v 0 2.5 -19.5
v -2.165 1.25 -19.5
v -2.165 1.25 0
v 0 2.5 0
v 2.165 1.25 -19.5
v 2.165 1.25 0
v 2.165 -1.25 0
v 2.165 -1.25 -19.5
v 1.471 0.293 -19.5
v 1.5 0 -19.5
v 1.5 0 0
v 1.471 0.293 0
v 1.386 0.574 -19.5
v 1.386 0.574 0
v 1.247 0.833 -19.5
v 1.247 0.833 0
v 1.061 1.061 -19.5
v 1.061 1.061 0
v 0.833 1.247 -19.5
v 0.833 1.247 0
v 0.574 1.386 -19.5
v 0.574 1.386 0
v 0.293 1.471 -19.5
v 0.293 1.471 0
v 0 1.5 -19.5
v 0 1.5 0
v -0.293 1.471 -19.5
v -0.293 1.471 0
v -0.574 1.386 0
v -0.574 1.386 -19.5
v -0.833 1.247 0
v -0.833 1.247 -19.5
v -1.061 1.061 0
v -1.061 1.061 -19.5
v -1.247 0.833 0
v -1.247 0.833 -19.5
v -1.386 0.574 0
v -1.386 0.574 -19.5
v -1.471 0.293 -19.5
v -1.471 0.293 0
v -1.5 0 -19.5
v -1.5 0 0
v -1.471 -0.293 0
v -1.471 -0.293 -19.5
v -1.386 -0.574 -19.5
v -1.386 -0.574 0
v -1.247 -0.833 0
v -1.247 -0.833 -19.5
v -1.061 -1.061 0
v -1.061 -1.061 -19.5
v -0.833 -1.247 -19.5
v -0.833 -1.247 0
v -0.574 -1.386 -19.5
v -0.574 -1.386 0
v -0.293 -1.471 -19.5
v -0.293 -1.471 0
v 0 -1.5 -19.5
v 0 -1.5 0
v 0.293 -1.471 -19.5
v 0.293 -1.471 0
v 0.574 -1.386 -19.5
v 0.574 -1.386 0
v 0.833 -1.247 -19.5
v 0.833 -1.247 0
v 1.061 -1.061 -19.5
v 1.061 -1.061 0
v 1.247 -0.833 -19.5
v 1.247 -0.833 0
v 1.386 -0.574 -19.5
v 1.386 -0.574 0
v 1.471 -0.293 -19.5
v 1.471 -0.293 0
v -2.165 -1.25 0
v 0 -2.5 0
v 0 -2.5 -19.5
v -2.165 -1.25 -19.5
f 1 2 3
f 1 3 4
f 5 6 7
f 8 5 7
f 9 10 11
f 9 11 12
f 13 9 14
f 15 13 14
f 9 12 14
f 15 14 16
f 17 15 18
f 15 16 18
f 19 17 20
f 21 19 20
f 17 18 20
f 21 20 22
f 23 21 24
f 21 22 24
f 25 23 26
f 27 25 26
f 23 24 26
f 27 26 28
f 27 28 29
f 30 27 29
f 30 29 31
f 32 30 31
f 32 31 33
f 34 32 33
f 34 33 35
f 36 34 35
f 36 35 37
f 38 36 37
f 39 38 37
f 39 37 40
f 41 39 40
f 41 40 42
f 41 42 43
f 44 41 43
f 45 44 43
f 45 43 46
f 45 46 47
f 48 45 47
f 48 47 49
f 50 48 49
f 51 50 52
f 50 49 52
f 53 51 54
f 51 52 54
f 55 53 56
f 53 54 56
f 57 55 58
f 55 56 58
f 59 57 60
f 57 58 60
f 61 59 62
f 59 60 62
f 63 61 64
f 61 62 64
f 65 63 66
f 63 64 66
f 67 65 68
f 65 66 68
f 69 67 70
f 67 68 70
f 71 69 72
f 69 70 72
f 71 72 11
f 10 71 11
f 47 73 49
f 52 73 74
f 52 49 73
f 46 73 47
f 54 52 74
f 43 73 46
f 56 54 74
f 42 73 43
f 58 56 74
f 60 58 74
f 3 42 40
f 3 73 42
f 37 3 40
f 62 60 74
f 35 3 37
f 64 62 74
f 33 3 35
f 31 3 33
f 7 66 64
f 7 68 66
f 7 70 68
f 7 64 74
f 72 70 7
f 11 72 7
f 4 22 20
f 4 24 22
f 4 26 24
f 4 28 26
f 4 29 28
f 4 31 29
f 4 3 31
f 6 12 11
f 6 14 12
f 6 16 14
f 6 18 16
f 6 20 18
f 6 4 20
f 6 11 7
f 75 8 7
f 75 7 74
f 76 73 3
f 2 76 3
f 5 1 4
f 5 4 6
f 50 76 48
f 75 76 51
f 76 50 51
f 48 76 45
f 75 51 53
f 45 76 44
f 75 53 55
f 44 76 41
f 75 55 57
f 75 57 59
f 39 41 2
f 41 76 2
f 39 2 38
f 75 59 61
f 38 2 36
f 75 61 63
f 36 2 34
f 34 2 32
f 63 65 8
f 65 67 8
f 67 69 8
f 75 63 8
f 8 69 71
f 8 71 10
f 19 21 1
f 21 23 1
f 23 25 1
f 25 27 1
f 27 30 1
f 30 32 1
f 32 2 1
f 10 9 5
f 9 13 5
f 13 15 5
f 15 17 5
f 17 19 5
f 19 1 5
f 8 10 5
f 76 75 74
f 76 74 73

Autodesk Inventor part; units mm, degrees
ref_plane "YZ Plane" through (0, 0, 0) normal (1, 0, 0) x (0, 1, 0)
ref_plane "XZ Plane" through (0, 0, 0) normal (0, 1, 0) x (-1, 0, 0)
ref_plane "XY Plane" through (0, 0, 0) normal (0, 0, 1) x (1, 0, 0)
sketch "Эскиз1" plane through (0, 0, 0) normal (0, 0, 1) x (1, 0, 0)
  line L0 (0, 2.5) -> (2.1651, 1.25)
  line L1 (2.1651, 1.25) -> (2.1651, -1.25)
  line L2 (2.1651, -1.25) -> (0, -2.5)
  line L3 (0, -2.5) -> (-2.1651, -1.25)
  line L4 (-2.1651, -1.25) -> (-2.1651, 1.25)
  line L5 (-2.1651, 1.25) -> (0, 2.5)
  point P0 (0, 0)
  point P1 (0, 0)
  dimension "d0" = 5
extrude "Выдавливание1" add sketch "Эскиз1" against normal blind 19.5
sketch "Эскиз2" plane through (0, 0, 0) normal (0, 0, 1) x (1, 0, 0)
  circle A0 centre (0, 0) radius 1.5
  dimension "d3" = 3
extrude "Выдавливание2" cut sketch "Эскиз2" against normal through all
thread "Резьба1" size "M3x0.5" class "6H" standard "ANSI Metric M Profile" full length
properties part number "Кусок металла"
